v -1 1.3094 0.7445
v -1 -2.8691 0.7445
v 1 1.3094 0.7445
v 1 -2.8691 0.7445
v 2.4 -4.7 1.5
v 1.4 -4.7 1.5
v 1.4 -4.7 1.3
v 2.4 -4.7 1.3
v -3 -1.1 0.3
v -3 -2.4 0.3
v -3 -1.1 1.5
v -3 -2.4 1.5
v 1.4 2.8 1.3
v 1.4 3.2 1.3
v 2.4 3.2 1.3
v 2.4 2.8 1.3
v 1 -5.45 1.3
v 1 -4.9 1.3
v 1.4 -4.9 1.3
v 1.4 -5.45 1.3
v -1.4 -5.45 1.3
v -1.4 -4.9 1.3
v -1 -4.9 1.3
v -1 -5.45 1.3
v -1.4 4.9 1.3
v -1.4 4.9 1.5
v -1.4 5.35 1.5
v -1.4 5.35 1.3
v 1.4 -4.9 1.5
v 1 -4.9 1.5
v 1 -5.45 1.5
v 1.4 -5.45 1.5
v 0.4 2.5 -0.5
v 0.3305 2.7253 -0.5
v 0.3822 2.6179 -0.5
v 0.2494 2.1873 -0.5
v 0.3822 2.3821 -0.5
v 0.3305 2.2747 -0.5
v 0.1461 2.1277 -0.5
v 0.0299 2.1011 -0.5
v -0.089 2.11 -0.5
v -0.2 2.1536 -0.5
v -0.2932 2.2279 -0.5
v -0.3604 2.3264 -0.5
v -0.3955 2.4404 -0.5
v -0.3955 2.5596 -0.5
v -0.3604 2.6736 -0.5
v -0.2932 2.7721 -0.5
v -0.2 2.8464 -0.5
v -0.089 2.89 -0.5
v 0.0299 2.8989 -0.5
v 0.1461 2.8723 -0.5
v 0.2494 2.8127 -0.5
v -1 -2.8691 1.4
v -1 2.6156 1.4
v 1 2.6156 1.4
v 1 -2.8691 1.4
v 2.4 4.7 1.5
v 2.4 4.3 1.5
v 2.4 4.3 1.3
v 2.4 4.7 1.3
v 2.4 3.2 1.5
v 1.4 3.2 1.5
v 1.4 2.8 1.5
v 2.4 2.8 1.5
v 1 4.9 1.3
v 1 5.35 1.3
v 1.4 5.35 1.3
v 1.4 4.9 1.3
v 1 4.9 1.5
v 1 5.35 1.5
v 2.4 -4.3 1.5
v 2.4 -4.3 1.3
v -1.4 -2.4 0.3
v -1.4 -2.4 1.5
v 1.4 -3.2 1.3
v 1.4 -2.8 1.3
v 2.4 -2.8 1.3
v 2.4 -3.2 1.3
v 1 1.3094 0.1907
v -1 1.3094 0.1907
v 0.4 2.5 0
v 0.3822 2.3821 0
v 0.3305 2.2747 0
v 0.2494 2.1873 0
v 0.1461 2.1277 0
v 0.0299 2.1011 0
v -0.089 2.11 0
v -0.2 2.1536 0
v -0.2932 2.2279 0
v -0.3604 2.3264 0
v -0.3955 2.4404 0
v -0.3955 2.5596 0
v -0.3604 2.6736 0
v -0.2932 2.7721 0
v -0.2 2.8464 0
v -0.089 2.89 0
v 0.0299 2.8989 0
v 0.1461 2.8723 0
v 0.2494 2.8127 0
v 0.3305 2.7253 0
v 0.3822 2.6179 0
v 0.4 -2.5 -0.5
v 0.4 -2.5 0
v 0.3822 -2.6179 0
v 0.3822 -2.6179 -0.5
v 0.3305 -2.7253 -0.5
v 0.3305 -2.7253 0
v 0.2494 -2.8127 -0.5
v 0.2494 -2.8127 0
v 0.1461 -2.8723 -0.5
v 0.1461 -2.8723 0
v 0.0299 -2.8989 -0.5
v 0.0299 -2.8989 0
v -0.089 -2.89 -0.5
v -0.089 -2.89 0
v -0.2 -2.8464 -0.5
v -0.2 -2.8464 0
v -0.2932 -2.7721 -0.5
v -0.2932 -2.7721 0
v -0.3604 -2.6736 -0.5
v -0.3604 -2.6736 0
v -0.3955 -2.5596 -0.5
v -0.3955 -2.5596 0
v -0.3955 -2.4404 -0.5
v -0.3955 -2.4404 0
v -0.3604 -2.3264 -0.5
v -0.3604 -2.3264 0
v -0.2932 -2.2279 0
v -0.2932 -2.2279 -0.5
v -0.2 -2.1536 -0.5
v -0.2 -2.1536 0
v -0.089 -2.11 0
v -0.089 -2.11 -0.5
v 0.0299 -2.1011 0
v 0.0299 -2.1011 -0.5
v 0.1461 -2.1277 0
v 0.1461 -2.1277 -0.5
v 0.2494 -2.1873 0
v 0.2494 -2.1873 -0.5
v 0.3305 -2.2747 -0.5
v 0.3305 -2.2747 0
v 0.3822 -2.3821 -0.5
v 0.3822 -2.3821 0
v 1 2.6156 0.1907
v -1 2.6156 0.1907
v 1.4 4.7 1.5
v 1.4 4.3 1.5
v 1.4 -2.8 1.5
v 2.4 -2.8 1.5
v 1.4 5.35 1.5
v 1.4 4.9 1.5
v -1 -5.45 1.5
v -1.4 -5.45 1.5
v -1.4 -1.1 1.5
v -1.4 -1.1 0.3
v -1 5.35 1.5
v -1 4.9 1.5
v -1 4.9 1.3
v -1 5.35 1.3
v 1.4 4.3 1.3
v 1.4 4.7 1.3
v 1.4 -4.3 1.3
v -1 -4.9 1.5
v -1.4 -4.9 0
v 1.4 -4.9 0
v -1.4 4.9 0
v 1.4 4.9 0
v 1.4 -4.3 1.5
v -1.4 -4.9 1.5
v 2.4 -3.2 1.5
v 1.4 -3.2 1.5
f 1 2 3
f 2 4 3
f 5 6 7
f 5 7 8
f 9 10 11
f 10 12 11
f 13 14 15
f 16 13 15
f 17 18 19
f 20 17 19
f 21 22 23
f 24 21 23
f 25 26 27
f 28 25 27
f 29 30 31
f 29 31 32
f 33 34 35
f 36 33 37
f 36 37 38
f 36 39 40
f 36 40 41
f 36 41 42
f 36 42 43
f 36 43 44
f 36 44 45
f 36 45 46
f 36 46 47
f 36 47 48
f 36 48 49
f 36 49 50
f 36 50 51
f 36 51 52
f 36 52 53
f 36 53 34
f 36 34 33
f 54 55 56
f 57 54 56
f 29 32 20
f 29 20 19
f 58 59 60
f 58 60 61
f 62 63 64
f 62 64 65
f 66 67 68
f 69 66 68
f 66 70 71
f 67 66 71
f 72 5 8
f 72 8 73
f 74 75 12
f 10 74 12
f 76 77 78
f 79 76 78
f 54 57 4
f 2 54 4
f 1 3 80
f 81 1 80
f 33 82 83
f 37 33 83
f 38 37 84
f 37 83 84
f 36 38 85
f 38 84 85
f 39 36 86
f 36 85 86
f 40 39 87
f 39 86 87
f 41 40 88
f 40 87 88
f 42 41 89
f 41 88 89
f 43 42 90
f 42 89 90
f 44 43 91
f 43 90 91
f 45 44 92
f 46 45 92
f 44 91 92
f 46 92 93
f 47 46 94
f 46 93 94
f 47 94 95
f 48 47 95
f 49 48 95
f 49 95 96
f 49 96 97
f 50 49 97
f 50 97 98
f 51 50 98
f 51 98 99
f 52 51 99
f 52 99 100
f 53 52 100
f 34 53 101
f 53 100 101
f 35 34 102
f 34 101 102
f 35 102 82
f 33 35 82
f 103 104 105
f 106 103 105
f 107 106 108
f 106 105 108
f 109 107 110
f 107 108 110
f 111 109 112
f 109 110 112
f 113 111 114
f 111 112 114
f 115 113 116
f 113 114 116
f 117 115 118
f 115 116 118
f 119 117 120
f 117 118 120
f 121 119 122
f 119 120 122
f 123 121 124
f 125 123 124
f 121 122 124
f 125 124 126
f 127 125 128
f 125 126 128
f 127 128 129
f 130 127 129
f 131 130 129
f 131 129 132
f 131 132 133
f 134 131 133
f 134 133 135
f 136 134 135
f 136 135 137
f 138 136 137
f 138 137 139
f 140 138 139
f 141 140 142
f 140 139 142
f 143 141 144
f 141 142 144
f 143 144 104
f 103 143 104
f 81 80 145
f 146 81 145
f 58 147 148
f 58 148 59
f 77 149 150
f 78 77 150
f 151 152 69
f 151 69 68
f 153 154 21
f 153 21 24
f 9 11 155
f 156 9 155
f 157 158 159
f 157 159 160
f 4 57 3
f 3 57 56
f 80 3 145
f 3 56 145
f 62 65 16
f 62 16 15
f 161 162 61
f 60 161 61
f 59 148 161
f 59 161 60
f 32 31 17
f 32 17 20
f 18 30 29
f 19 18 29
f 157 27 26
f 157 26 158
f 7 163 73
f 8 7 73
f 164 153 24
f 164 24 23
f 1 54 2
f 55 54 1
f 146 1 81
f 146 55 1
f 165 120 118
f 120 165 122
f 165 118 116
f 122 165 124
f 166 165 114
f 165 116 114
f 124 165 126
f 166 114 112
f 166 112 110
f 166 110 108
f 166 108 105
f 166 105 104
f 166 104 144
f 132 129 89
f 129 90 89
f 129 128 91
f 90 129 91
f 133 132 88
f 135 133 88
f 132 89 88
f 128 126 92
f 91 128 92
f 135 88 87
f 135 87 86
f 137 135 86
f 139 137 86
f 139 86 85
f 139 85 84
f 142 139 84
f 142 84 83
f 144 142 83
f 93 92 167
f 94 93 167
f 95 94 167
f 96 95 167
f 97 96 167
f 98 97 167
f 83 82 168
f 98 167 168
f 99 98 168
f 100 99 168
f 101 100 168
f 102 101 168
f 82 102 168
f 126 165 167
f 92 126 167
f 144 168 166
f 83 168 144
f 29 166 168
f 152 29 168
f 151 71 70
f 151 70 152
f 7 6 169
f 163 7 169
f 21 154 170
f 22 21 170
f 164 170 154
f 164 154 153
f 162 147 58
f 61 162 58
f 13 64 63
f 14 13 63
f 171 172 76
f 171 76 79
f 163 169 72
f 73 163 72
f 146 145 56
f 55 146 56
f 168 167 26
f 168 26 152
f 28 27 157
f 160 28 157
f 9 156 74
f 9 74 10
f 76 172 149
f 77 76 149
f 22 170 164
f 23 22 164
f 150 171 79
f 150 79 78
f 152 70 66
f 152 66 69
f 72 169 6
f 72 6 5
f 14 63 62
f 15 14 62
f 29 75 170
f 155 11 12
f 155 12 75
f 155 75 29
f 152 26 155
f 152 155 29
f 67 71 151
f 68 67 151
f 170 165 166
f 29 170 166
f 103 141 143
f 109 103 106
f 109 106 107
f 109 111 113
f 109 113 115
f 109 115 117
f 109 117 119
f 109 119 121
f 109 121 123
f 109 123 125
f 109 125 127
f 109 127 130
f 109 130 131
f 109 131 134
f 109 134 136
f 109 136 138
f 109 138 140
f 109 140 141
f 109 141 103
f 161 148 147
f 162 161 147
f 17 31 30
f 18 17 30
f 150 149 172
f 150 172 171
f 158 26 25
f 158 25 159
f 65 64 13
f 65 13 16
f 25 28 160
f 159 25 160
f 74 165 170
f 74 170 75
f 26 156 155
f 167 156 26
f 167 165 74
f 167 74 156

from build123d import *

# Parameters (mm, degrees)
SKETCH1_W             = 2.8
SKETCH1_H             = 9.8
BOSS_EXTRUDE1_DEPTH   = 1.5
SKETCH2_W             = 1
SKETCH2_H             = 0.4
BOSS_EXTRUDE2_DEPTH   = 0.2
BOSS_EXTRUDE2_2_DEPTH = 0.2
BOSS_EXTRUDE2_3_DEPTH = 0.2
BOSS_EXTRUDE2_4_DEPTH = 0.2
SKETCH2_W_2           = 1.6
SKETCH2_H_2           = 1.3
BOSS_EXTRUDE2_5_DEPTH = 0.2
SKETCH2_W_3           = 0.4
SKETCH2_H_3           = 0.55
BOSS_EXTRUDE2_6_DEPTH = 0.2
BOSS_EXTRUDE2_7_DEPTH = 0.2
SKETCH2_H_4           = 0.45
BOSS_EXTRUDE2_8_DEPTH = 0.2
BOSS_EXTRUDE2_9_DEPTH = 0.2
SKETCH3_R             = 0.4
BOSS_EXTRUDE3_DEPTH   = 0.5
CUT_EXTRUDE1_DEPTH    = 1
SKETCH5_W             = 1.6
SKETCH5_H             = 1.3
BOSS_EXTRUDE4_DEPTH   = 1
SKETCH6_W             = 2
SKETCH6_H             = 5.484754905
BOSS_EXTRUDE5_DEPTH   = 0.1


with BuildPart() as part:
    # Sketch1 → Boss-Extrude1 (new body)
    with BuildSketch(Plane.XY):
        Rectangle(SKETCH1_W, SKETCH1_H)
    extrude(amount=BOSS_EXTRUDE1_DEPTH)

    # Sketch3 → Boss-Extrude3 (add)
    with BuildSketch(Plane(origin=(0, 0, 0), x_dir=(-1, 0, 0), z_dir=(0, 0, -1))):
        with Locations(Location((0, -2.5, 0), (0, 0, 180))):
            Circle(SKETCH3_R)
        with Locations(Location((0, 2.5, 0), (0, 0, 180))):
            Circle(SKETCH3_R)
    extrude(amount=BOSS_EXTRUDE3_DEPTH)

    # Sketch4 → Cut-Extrude1 (cut, symmetric)
    with BuildSketch(Plane(origin=(0, 0, 0), x_dir=(0, 0, -1), z_dir=(1, 0, 0))):
        Polygon((-1.23487483, -2.869112244), (-0.744508889, -2.869112244), (-0.744508889, 1.309379028), (-0.190734918, 1.309379028), (-0.190734918, 2.615642661), (-1.23487483, 2.615642661), (-1.5, 2.615642661), (-1.5, -2.869112244), align=None)
    extrude(amount=CUT_EXTRUDE1_DEPTH, both=True, mode=Mode.SUBTRACT)



with BuildPart() as body_2:
    # Sketch2 → Boss-Extrude2 (new body)
    with BuildSketch(Plane.XY.offset(1.5)):
        with Locations((1.9, -4.5)):
            Rectangle(SKETCH2_W, SKETCH2_H)
    extrude(amount=-BOSS_EXTRUDE2_DEPTH)


with BuildPart() as body_3:
    # Sketch2 → Boss-Extrude2 2 (new body)
    with BuildSketch(Plane.XY.offset(1.5)):
        with Locations((1.9, -3)):
            Rectangle(SKETCH2_W, SKETCH2_H)
    extrude(amount=-BOSS_EXTRUDE2_2_DEPTH)


with BuildPart() as body_4:
    # Sketch2 → Boss-Extrude2 3 (new body)
    with BuildSketch(Plane.XY.offset(1.5)):
        with Locations((1.9, 3)):
            Rectangle(SKETCH2_W, SKETCH2_H)
    extrude(amount=-BOSS_EXTRUDE2_3_DEPTH)


with BuildPart() as body_5:
    # Sketch2 → Boss-Extrude2 4 (new body)
    with BuildSketch(Plane.XY.offset(1.5)):
        with Locations((1.9, 4.5)):
            Rectangle(SKETCH2_W, SKETCH2_H)
    extrude(amount=-BOSS_EXTRUDE2_4_DEPTH)


with BuildPart() as body_6:
    # Sketch2 → Boss-Extrude2 5 (new body)
    with BuildSketch(Plane.XY.offset(1.5)):
        with Locations((-2.2, -1.75)):
            Rectangle(SKETCH2_W_2, SKETCH2_H_2)
    extrude(amount=-BOSS_EXTRUDE2_5_DEPTH)


with BuildPart() as body_7:
    # Sketch2 → Boss-Extrude2 6 (new body)
    with BuildSketch(Plane.XY.offset(1.5)):
        with Locations((-1.2, -5.175)):
            Rectangle(SKETCH2_W_3, SKETCH2_H_3)
    extrude(amount=-BOSS_EXTRUDE2_6_DEPTH)


with BuildPart() as body_8:
    # Sketch2 → Boss-Extrude2 7 (new body)
    with BuildSketch(Plane.XY.offset(1.5)):
        with Locations((1.2, -5.175)):
            Rectangle(SKETCH2_W_3, SKETCH2_H_3)
    extrude(amount=-BOSS_EXTRUDE2_7_DEPTH)


with BuildPart() as body_9:
    # Sketch2 → Boss-Extrude2 8 (new body)
    with BuildSketch(Plane.XY.offset(1.5)):
        with Locations((-1.2, 5.125)):
            Rectangle(SKETCH2_W_3, SKETCH2_H_4)
    extrude(amount=-BOSS_EXTRUDE2_8_DEPTH)


with BuildPart() as body_10:
    # Sketch2 → Boss-Extrude2 9 (new body)
    with BuildSketch(Plane.XY.offset(1.5)):
        with Locations((1.2, 5.125)):
            Rectangle(SKETCH2_W_3, SKETCH2_H_4)
    extrude(amount=-BOSS_EXTRUDE2_9_DEPTH)


with BuildPart() as part_1:
    add(part.part)

    add(body_6.part)  # Boss-Extrude4 merges body 6
    # Sketch5 → Boss-Extrude4 (add)
    with BuildSketch(Plane(origin=(0, 0, 1.3), x_dir=(-1, 0, 0), z_dir=(0, 0, -1))):
        with Locations((2.2, -1.75)):
            Rectangle(SKETCH5_W, SKETCH5_H)
    extrude(amount=BOSS_EXTRUDE4_DEPTH)

    # Sketch6 → Boss-Extrude5 (add)
    with BuildSketch(Plane.XY.offset(1.5)):
        with Locations((0, -0.126734791)):
            Rectangle(SKETCH6_W, SKETCH6_H)
    extrude(amount=-BOSS_EXTRUDE5_DEPTH)


solid = Compound([body_2.part, body_3.part, body_4.part, body_5.part, body_7.part, body_8.part, body_9.part, body_10.part, part_1.part])
